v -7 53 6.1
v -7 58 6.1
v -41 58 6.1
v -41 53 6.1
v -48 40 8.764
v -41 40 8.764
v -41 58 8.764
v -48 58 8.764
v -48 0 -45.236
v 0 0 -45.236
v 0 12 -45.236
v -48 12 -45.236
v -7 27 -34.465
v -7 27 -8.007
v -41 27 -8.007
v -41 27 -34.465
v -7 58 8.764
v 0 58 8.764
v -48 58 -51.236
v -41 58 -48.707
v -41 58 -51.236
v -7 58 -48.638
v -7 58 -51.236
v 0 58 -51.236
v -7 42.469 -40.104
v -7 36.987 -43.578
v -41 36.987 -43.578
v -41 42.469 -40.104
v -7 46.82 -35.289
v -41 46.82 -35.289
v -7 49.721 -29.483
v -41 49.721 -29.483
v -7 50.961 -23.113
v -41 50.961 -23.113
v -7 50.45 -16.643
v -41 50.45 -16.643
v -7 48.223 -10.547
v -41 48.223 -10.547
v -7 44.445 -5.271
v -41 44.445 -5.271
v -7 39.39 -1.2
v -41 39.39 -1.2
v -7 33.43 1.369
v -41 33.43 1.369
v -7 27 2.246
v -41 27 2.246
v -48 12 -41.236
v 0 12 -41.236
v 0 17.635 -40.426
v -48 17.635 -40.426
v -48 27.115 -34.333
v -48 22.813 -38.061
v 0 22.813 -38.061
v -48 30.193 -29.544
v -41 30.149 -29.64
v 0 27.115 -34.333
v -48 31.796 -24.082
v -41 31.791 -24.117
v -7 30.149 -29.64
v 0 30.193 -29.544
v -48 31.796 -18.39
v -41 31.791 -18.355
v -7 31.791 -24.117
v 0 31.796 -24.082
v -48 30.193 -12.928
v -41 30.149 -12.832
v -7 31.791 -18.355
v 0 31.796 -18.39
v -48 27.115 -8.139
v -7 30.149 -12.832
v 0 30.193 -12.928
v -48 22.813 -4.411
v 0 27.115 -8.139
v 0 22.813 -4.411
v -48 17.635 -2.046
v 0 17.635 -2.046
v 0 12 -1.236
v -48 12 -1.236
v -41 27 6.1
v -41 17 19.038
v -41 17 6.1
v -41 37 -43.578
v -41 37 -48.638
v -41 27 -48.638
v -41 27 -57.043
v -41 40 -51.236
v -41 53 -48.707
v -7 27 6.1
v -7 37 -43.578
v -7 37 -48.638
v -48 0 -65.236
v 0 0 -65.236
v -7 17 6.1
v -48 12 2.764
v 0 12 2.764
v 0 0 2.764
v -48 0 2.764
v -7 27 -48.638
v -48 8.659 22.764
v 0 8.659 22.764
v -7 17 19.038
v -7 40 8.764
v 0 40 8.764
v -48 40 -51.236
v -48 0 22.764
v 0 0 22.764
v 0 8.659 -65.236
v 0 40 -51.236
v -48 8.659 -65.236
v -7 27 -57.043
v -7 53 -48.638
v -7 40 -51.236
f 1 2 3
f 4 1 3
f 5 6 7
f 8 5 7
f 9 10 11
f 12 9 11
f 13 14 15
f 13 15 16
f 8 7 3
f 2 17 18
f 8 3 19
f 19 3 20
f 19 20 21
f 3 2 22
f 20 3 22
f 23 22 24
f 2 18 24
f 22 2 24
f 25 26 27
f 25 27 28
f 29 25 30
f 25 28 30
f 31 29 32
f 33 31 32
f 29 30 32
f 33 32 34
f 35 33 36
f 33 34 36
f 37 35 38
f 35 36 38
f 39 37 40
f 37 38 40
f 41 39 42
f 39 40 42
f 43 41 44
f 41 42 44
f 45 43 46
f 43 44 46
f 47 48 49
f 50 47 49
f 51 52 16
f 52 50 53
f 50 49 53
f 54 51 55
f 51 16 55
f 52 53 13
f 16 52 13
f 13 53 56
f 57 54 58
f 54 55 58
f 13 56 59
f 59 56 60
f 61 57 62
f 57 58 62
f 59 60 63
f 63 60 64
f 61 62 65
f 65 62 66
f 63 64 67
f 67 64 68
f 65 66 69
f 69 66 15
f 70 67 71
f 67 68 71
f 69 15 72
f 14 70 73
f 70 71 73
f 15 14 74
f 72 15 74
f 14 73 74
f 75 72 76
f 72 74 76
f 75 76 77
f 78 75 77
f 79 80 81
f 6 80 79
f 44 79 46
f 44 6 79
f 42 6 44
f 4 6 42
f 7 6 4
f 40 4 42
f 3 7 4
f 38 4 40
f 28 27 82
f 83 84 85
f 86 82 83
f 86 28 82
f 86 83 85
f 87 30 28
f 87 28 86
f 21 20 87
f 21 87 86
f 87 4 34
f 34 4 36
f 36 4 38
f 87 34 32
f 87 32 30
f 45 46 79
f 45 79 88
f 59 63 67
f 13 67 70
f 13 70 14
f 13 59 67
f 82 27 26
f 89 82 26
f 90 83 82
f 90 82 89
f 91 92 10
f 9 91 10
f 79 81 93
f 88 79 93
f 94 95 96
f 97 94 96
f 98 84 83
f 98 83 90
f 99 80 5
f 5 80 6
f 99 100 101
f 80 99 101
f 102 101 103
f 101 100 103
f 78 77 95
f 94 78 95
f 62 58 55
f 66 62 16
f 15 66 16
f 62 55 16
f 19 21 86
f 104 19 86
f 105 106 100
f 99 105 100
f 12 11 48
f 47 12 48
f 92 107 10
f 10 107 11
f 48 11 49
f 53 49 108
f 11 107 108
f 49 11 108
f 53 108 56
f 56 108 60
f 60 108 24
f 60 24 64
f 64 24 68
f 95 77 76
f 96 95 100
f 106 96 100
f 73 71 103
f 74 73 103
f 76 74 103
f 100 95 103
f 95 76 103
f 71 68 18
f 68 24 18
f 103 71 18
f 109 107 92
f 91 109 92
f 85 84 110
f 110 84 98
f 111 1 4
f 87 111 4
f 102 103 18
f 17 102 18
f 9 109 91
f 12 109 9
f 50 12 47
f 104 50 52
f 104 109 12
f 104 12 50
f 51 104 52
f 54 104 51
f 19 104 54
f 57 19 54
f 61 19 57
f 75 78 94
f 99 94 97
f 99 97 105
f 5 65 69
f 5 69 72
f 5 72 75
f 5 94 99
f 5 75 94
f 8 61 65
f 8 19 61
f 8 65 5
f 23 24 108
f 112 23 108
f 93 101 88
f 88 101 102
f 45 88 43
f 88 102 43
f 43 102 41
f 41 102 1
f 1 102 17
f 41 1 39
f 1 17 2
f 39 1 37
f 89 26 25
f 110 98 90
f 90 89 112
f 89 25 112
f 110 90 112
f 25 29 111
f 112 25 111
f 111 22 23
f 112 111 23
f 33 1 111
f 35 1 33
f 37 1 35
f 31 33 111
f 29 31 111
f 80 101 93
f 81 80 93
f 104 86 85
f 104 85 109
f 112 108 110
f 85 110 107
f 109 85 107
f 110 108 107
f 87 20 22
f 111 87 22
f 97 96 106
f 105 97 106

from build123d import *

# Parameters (mm, degrees)
BOSS_EXTRUDE1_DEPTH = 48
CUT_EXTRUDE1_DEPTH  = 34
SKETCH4_W           = 34
SKETCH4_H           = 5.062205584
BOSS_EXTRUDE2_DEPTH = 10
SKETCH6_W           = 34
SKETCH6_H           = 31
CUT_EXTRUDE3_DEPTH  = 101.30083919
BOSS_EXTRUDE3_DEPTH = 34
SKETCH9_W           = 34
SKETCH9_H           = 5.06
BOSS_EXTRUDE4_DEPTH = 10
BOSS_EXTRUDE5_DEPTH = 5


with BuildPart() as part:
    # Sketch1 → Boss-Extrude1 (new body)
    with BuildSketch(Plane(origin=(0, 0, 0), x_dir=(0, 0, -1), z_dir=(1, 0, 0))):
        with BuildLine():
            Line((-22.763988027, 0), (-22.763988027, 8.659101585))
            Line((-22.763988027, 8.659101585), (-8.763988027, 40))
            Line((-8.763988027, 40), (-8.763988027, 58))
            Line((-8.763988027, 58), (51.236011973, 58))
            Line((51.236011973, 58), (51.236011973, 40))
            Line((51.236011973, 40), (65.236011973, 8.659101585))
            Line((65.236011973, 8.659101585), (65.236011973, 0))
            Line((65.236011973, 0), (45.236011973, 0))
            Line((45.236011973, 0), (45.236011973, 12))
            Line((45.236011973, 12), (41.236011973, 12))
            ThreePointArc((41.236011973, 12), (21.236011973, 32), (1.236011973, 12))
            Line((1.236011973, 12), (-2.763988027, 12))
            Line((-2.763988027, 12), (-2.763988027, 0))
            Line((-2.763988027, 0), (-22.763988027, 0))
        make_face()
    extrude(amount=-BOSS_EXTRUDE1_DEPTH)

    # Sketch3 → Cut-Extrude1 (cut)
    with BuildSketch(Plane(origin=(-7, 0, 0), x_dir=(0, 0, -1), z_dir=(1, 0, 0))):
        Polygon((-19.038103202, 17), (-1.038103202, 17), (-1.038103202, 58), (-8.763988027, 58), (-8.763988027, 40), align=None)
    extrude(amount=-CUT_EXTRUDE1_DEPTH, mode=Mode.SUBTRACT)

    # Sketch4 → Boss-Extrude2 (add)
    with BuildSketch(Plane(origin=(0, 17, 0), x_dir=(1, 0, 0), z_dir=(0, 1, 0))):
        with Locations((-24, -3.569205994)):
            Rectangle(SKETCH4_W, SKETCH4_H)
    extrude(amount=BOSS_EXTRUDE2_DEPTH)

    # Sketch6 → Cut-Extrude3 (cut, through all)
    with BuildSketch(Plane.XY.offset(1.038103202)):
        with Locations((-24, 42.5)):
            Rectangle(SKETCH6_W, SKETCH6_H)
    extrude(amount=-CUT_EXTRUDE3_DEPTH, mode=Mode.SUBTRACT)

    # Sketch8 → Boss-Extrude3 (add)
    with BuildSketch(Plane(origin=(-41, 0, 0), x_dir=(0, 0, -1), z_dir=(1, 0, 0))):
        with BuildLine():
            Line((-2.24605546, 27), (45.75394454, 27))
            ThreePointArc((45.75394454, 27), (21.75394454, 51), (-2.24605546, 27))
        make_face()
    extrude(amount=BOSS_EXTRUDE3_DEPTH)

    # Sketch9 → Boss-Extrude4 (add)
    with BuildSketch(Plane(origin=(0, 27, 0), x_dir=(1, 0, 0), z_dir=(0, 1, 0))):
        with Locations((-24, 46.107548199)):
            Rectangle(SKETCH9_W, SKETCH9_H)
    extrude(amount=BOSS_EXTRUDE4_DEPTH)

    # Sketch10 → Boss-Extrude5 (add)
    with BuildSketch(Plane(origin=(0, 58, 0), x_dir=(1, 0, 0), z_dir=(0, 1, 0))):
        Polygon((-41, 48.707326909), (-7, 48.637548199), (-7, -6.100308786), (-41, -6.100308786), align=None)
    extrude(amount=-BOSS_EXTRUDE5_DEPTH)


solid = part.part
